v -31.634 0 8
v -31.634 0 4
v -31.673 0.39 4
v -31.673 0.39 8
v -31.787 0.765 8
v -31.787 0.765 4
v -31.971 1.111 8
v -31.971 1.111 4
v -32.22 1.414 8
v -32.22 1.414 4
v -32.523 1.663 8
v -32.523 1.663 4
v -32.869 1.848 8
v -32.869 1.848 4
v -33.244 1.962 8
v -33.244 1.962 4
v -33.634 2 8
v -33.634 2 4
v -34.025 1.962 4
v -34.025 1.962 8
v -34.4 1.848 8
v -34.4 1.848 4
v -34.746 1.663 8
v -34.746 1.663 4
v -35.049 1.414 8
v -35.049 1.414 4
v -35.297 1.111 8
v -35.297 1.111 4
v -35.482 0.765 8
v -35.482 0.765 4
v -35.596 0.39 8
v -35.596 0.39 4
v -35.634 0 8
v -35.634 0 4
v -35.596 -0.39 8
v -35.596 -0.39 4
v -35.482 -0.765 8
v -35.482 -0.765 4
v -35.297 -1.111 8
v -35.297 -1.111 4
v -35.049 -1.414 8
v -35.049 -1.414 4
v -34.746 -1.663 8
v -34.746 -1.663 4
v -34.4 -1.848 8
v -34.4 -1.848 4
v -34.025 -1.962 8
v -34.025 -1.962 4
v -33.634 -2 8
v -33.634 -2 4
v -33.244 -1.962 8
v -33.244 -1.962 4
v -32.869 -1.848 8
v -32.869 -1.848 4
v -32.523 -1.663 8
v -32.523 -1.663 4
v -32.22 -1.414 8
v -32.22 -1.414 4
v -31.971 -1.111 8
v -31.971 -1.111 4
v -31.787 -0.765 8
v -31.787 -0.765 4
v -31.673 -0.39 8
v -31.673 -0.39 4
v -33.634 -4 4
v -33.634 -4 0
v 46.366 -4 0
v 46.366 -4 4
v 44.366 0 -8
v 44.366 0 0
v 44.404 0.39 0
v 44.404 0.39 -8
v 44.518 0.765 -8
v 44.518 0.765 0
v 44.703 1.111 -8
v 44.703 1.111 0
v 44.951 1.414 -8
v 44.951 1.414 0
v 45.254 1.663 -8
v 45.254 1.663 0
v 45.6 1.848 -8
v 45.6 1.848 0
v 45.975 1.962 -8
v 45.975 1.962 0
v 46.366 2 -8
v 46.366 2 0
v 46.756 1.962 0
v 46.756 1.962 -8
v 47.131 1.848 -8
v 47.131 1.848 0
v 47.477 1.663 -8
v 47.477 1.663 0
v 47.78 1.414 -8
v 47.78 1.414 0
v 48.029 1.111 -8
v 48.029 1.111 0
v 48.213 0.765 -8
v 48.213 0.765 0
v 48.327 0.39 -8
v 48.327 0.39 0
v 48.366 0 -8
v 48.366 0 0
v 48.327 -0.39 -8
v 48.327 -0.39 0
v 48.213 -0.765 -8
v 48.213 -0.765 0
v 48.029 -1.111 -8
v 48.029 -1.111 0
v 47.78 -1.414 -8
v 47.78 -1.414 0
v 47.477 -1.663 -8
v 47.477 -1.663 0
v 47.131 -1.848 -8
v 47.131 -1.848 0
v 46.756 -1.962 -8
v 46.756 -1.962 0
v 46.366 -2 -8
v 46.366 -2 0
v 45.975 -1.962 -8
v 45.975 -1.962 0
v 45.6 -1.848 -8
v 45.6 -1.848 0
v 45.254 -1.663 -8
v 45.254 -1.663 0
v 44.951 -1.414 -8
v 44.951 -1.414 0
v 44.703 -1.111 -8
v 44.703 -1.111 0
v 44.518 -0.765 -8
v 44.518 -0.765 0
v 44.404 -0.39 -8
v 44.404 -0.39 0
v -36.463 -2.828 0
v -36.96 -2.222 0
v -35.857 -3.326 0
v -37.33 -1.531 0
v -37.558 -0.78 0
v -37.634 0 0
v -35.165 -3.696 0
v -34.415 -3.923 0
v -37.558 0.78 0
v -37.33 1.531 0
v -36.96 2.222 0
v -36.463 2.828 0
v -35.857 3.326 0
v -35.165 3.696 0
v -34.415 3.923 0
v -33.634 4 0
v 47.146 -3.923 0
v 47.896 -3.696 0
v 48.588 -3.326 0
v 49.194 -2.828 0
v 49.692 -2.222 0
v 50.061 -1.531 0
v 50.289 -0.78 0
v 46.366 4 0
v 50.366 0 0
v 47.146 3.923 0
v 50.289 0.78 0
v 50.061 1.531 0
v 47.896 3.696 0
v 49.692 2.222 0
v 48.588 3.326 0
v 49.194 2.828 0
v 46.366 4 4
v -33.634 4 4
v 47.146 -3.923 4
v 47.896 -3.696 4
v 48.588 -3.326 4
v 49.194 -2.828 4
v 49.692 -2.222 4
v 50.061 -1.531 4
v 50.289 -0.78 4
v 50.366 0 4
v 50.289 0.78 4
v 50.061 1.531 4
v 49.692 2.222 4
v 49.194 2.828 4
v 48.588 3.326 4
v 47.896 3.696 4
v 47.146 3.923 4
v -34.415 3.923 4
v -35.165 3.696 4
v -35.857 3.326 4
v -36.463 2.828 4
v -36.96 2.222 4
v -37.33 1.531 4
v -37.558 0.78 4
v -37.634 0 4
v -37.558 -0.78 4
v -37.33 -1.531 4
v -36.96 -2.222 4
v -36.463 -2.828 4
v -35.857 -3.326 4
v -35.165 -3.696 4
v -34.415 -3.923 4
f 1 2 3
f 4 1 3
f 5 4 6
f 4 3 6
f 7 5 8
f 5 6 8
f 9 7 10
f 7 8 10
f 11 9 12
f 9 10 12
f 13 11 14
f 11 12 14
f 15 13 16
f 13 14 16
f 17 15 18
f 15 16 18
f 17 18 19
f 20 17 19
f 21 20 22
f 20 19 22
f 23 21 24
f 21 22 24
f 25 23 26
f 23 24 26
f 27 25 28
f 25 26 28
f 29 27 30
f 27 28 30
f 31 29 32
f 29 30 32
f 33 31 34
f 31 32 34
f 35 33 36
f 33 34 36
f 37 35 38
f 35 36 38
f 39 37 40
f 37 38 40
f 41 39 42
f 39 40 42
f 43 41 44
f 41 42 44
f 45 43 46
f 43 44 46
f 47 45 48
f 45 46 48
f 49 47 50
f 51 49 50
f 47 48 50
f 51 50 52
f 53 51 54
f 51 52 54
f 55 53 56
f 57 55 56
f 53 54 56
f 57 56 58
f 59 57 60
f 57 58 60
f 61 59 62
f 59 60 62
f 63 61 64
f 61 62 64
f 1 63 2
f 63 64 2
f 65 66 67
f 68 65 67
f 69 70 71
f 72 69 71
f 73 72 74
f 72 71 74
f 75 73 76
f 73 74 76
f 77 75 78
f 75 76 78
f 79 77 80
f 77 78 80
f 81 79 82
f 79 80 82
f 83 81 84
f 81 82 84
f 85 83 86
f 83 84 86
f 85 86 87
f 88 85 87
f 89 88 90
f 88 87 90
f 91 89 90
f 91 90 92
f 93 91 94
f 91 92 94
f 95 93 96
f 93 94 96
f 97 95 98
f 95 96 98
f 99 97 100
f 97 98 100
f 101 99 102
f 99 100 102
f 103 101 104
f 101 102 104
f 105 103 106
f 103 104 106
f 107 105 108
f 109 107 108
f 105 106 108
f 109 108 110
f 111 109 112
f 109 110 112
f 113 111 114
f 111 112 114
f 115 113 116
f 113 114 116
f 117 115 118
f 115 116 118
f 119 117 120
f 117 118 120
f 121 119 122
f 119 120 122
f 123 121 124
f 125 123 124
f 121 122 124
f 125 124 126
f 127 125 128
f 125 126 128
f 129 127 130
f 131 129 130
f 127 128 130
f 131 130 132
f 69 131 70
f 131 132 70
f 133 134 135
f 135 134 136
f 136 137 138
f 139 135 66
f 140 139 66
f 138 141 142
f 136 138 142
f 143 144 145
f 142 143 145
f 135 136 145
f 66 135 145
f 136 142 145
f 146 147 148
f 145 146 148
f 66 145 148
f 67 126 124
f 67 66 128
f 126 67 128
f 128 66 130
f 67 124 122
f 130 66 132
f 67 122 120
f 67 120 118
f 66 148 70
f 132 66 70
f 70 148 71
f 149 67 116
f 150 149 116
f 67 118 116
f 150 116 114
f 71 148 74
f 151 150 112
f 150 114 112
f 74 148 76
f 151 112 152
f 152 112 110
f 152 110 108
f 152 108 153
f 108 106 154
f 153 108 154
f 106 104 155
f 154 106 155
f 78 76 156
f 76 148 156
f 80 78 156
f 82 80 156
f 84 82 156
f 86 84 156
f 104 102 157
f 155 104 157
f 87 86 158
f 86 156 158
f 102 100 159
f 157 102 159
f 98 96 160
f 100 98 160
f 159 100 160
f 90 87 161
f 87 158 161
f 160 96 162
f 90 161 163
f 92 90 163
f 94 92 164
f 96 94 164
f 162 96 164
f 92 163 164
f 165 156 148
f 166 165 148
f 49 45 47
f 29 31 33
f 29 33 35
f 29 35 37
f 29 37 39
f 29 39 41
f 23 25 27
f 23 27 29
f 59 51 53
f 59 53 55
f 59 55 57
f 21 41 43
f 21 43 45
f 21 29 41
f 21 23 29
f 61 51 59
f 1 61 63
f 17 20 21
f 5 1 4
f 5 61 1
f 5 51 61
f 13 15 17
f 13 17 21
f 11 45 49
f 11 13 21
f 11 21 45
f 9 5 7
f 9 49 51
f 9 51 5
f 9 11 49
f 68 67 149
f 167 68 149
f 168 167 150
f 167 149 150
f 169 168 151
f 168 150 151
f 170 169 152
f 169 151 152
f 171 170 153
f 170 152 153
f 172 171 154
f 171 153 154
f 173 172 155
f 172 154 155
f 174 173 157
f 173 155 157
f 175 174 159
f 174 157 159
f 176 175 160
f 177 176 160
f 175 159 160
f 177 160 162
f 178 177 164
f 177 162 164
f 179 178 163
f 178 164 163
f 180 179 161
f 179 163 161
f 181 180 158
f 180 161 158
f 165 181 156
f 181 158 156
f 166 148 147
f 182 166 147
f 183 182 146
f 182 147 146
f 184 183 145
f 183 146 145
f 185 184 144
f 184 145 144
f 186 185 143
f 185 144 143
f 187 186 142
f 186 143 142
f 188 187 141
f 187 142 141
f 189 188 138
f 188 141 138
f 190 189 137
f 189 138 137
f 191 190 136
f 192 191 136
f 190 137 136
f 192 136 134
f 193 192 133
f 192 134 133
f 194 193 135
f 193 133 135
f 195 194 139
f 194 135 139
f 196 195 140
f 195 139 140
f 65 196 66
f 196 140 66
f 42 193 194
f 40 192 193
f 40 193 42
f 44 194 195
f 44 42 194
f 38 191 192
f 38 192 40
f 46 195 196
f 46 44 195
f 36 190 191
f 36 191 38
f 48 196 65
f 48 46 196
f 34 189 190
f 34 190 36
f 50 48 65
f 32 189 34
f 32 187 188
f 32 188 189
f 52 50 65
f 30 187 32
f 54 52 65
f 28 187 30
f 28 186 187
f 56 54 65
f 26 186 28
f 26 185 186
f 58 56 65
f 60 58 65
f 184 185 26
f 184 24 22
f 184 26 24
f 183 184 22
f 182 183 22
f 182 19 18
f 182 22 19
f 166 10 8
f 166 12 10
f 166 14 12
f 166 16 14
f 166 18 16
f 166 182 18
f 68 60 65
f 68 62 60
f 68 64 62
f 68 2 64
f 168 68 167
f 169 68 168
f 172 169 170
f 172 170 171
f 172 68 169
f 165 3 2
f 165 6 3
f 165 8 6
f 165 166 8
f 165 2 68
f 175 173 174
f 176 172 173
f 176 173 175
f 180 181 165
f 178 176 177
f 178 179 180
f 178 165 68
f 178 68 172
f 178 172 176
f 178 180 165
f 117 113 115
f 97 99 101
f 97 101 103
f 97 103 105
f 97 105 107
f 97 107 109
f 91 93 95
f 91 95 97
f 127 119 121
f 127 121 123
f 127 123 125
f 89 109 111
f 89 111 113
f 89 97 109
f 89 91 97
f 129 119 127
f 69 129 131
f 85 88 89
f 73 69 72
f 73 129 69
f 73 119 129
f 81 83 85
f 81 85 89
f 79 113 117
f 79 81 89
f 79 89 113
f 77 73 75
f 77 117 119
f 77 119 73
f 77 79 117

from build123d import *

# Parameters (mm, degrees)
EXTRUDE_1_DEPTH = 4
SKETCH_2_R      = 2
EXTRUDE_2_DEPTH = 8
SKETCH_3_R      = 2
EXTRUDE_3_DEPTH = 4


with BuildPart() as part:
    # 草图1 → 凸台-拉伸1 (new body)
    with BuildSketch(Plane.XY):
        with BuildLine():
            Line((-33.634370857, -4), (46.365629143, -4))
            ThreePointArc((46.365629143, -4), (50.365629143, 0), (46.365629143, 4))
            Line((46.365629143, 4), (-33.634370857, 4))
            ThreePointArc((-33.634370857, 4), (-37.634370857, 0), (-33.634370857, -4))
        make_face()
    extrude(amount=EXTRUDE_1_DEPTH)

    # 草图2 → 凸台-拉伸2 (add)
    with BuildSketch(Plane(origin=(0, 0, 0), x_dir=(-1, 0, 0), z_dir=(0, 0, -1))):
        with Locations((-46.365629143, 0)):
            Circle(SKETCH_2_R)
    extrude(amount=EXTRUDE_2_DEPTH)

    # 草图3 → 凸台-拉伸3 (add)
    with BuildSketch(Plane.XY.offset(4)):
        with Locations((-33.634370857, 0)):
            Circle(SKETCH_3_R)
    extrude(amount=EXTRUDE_3_DEPTH)


solid = part.part
